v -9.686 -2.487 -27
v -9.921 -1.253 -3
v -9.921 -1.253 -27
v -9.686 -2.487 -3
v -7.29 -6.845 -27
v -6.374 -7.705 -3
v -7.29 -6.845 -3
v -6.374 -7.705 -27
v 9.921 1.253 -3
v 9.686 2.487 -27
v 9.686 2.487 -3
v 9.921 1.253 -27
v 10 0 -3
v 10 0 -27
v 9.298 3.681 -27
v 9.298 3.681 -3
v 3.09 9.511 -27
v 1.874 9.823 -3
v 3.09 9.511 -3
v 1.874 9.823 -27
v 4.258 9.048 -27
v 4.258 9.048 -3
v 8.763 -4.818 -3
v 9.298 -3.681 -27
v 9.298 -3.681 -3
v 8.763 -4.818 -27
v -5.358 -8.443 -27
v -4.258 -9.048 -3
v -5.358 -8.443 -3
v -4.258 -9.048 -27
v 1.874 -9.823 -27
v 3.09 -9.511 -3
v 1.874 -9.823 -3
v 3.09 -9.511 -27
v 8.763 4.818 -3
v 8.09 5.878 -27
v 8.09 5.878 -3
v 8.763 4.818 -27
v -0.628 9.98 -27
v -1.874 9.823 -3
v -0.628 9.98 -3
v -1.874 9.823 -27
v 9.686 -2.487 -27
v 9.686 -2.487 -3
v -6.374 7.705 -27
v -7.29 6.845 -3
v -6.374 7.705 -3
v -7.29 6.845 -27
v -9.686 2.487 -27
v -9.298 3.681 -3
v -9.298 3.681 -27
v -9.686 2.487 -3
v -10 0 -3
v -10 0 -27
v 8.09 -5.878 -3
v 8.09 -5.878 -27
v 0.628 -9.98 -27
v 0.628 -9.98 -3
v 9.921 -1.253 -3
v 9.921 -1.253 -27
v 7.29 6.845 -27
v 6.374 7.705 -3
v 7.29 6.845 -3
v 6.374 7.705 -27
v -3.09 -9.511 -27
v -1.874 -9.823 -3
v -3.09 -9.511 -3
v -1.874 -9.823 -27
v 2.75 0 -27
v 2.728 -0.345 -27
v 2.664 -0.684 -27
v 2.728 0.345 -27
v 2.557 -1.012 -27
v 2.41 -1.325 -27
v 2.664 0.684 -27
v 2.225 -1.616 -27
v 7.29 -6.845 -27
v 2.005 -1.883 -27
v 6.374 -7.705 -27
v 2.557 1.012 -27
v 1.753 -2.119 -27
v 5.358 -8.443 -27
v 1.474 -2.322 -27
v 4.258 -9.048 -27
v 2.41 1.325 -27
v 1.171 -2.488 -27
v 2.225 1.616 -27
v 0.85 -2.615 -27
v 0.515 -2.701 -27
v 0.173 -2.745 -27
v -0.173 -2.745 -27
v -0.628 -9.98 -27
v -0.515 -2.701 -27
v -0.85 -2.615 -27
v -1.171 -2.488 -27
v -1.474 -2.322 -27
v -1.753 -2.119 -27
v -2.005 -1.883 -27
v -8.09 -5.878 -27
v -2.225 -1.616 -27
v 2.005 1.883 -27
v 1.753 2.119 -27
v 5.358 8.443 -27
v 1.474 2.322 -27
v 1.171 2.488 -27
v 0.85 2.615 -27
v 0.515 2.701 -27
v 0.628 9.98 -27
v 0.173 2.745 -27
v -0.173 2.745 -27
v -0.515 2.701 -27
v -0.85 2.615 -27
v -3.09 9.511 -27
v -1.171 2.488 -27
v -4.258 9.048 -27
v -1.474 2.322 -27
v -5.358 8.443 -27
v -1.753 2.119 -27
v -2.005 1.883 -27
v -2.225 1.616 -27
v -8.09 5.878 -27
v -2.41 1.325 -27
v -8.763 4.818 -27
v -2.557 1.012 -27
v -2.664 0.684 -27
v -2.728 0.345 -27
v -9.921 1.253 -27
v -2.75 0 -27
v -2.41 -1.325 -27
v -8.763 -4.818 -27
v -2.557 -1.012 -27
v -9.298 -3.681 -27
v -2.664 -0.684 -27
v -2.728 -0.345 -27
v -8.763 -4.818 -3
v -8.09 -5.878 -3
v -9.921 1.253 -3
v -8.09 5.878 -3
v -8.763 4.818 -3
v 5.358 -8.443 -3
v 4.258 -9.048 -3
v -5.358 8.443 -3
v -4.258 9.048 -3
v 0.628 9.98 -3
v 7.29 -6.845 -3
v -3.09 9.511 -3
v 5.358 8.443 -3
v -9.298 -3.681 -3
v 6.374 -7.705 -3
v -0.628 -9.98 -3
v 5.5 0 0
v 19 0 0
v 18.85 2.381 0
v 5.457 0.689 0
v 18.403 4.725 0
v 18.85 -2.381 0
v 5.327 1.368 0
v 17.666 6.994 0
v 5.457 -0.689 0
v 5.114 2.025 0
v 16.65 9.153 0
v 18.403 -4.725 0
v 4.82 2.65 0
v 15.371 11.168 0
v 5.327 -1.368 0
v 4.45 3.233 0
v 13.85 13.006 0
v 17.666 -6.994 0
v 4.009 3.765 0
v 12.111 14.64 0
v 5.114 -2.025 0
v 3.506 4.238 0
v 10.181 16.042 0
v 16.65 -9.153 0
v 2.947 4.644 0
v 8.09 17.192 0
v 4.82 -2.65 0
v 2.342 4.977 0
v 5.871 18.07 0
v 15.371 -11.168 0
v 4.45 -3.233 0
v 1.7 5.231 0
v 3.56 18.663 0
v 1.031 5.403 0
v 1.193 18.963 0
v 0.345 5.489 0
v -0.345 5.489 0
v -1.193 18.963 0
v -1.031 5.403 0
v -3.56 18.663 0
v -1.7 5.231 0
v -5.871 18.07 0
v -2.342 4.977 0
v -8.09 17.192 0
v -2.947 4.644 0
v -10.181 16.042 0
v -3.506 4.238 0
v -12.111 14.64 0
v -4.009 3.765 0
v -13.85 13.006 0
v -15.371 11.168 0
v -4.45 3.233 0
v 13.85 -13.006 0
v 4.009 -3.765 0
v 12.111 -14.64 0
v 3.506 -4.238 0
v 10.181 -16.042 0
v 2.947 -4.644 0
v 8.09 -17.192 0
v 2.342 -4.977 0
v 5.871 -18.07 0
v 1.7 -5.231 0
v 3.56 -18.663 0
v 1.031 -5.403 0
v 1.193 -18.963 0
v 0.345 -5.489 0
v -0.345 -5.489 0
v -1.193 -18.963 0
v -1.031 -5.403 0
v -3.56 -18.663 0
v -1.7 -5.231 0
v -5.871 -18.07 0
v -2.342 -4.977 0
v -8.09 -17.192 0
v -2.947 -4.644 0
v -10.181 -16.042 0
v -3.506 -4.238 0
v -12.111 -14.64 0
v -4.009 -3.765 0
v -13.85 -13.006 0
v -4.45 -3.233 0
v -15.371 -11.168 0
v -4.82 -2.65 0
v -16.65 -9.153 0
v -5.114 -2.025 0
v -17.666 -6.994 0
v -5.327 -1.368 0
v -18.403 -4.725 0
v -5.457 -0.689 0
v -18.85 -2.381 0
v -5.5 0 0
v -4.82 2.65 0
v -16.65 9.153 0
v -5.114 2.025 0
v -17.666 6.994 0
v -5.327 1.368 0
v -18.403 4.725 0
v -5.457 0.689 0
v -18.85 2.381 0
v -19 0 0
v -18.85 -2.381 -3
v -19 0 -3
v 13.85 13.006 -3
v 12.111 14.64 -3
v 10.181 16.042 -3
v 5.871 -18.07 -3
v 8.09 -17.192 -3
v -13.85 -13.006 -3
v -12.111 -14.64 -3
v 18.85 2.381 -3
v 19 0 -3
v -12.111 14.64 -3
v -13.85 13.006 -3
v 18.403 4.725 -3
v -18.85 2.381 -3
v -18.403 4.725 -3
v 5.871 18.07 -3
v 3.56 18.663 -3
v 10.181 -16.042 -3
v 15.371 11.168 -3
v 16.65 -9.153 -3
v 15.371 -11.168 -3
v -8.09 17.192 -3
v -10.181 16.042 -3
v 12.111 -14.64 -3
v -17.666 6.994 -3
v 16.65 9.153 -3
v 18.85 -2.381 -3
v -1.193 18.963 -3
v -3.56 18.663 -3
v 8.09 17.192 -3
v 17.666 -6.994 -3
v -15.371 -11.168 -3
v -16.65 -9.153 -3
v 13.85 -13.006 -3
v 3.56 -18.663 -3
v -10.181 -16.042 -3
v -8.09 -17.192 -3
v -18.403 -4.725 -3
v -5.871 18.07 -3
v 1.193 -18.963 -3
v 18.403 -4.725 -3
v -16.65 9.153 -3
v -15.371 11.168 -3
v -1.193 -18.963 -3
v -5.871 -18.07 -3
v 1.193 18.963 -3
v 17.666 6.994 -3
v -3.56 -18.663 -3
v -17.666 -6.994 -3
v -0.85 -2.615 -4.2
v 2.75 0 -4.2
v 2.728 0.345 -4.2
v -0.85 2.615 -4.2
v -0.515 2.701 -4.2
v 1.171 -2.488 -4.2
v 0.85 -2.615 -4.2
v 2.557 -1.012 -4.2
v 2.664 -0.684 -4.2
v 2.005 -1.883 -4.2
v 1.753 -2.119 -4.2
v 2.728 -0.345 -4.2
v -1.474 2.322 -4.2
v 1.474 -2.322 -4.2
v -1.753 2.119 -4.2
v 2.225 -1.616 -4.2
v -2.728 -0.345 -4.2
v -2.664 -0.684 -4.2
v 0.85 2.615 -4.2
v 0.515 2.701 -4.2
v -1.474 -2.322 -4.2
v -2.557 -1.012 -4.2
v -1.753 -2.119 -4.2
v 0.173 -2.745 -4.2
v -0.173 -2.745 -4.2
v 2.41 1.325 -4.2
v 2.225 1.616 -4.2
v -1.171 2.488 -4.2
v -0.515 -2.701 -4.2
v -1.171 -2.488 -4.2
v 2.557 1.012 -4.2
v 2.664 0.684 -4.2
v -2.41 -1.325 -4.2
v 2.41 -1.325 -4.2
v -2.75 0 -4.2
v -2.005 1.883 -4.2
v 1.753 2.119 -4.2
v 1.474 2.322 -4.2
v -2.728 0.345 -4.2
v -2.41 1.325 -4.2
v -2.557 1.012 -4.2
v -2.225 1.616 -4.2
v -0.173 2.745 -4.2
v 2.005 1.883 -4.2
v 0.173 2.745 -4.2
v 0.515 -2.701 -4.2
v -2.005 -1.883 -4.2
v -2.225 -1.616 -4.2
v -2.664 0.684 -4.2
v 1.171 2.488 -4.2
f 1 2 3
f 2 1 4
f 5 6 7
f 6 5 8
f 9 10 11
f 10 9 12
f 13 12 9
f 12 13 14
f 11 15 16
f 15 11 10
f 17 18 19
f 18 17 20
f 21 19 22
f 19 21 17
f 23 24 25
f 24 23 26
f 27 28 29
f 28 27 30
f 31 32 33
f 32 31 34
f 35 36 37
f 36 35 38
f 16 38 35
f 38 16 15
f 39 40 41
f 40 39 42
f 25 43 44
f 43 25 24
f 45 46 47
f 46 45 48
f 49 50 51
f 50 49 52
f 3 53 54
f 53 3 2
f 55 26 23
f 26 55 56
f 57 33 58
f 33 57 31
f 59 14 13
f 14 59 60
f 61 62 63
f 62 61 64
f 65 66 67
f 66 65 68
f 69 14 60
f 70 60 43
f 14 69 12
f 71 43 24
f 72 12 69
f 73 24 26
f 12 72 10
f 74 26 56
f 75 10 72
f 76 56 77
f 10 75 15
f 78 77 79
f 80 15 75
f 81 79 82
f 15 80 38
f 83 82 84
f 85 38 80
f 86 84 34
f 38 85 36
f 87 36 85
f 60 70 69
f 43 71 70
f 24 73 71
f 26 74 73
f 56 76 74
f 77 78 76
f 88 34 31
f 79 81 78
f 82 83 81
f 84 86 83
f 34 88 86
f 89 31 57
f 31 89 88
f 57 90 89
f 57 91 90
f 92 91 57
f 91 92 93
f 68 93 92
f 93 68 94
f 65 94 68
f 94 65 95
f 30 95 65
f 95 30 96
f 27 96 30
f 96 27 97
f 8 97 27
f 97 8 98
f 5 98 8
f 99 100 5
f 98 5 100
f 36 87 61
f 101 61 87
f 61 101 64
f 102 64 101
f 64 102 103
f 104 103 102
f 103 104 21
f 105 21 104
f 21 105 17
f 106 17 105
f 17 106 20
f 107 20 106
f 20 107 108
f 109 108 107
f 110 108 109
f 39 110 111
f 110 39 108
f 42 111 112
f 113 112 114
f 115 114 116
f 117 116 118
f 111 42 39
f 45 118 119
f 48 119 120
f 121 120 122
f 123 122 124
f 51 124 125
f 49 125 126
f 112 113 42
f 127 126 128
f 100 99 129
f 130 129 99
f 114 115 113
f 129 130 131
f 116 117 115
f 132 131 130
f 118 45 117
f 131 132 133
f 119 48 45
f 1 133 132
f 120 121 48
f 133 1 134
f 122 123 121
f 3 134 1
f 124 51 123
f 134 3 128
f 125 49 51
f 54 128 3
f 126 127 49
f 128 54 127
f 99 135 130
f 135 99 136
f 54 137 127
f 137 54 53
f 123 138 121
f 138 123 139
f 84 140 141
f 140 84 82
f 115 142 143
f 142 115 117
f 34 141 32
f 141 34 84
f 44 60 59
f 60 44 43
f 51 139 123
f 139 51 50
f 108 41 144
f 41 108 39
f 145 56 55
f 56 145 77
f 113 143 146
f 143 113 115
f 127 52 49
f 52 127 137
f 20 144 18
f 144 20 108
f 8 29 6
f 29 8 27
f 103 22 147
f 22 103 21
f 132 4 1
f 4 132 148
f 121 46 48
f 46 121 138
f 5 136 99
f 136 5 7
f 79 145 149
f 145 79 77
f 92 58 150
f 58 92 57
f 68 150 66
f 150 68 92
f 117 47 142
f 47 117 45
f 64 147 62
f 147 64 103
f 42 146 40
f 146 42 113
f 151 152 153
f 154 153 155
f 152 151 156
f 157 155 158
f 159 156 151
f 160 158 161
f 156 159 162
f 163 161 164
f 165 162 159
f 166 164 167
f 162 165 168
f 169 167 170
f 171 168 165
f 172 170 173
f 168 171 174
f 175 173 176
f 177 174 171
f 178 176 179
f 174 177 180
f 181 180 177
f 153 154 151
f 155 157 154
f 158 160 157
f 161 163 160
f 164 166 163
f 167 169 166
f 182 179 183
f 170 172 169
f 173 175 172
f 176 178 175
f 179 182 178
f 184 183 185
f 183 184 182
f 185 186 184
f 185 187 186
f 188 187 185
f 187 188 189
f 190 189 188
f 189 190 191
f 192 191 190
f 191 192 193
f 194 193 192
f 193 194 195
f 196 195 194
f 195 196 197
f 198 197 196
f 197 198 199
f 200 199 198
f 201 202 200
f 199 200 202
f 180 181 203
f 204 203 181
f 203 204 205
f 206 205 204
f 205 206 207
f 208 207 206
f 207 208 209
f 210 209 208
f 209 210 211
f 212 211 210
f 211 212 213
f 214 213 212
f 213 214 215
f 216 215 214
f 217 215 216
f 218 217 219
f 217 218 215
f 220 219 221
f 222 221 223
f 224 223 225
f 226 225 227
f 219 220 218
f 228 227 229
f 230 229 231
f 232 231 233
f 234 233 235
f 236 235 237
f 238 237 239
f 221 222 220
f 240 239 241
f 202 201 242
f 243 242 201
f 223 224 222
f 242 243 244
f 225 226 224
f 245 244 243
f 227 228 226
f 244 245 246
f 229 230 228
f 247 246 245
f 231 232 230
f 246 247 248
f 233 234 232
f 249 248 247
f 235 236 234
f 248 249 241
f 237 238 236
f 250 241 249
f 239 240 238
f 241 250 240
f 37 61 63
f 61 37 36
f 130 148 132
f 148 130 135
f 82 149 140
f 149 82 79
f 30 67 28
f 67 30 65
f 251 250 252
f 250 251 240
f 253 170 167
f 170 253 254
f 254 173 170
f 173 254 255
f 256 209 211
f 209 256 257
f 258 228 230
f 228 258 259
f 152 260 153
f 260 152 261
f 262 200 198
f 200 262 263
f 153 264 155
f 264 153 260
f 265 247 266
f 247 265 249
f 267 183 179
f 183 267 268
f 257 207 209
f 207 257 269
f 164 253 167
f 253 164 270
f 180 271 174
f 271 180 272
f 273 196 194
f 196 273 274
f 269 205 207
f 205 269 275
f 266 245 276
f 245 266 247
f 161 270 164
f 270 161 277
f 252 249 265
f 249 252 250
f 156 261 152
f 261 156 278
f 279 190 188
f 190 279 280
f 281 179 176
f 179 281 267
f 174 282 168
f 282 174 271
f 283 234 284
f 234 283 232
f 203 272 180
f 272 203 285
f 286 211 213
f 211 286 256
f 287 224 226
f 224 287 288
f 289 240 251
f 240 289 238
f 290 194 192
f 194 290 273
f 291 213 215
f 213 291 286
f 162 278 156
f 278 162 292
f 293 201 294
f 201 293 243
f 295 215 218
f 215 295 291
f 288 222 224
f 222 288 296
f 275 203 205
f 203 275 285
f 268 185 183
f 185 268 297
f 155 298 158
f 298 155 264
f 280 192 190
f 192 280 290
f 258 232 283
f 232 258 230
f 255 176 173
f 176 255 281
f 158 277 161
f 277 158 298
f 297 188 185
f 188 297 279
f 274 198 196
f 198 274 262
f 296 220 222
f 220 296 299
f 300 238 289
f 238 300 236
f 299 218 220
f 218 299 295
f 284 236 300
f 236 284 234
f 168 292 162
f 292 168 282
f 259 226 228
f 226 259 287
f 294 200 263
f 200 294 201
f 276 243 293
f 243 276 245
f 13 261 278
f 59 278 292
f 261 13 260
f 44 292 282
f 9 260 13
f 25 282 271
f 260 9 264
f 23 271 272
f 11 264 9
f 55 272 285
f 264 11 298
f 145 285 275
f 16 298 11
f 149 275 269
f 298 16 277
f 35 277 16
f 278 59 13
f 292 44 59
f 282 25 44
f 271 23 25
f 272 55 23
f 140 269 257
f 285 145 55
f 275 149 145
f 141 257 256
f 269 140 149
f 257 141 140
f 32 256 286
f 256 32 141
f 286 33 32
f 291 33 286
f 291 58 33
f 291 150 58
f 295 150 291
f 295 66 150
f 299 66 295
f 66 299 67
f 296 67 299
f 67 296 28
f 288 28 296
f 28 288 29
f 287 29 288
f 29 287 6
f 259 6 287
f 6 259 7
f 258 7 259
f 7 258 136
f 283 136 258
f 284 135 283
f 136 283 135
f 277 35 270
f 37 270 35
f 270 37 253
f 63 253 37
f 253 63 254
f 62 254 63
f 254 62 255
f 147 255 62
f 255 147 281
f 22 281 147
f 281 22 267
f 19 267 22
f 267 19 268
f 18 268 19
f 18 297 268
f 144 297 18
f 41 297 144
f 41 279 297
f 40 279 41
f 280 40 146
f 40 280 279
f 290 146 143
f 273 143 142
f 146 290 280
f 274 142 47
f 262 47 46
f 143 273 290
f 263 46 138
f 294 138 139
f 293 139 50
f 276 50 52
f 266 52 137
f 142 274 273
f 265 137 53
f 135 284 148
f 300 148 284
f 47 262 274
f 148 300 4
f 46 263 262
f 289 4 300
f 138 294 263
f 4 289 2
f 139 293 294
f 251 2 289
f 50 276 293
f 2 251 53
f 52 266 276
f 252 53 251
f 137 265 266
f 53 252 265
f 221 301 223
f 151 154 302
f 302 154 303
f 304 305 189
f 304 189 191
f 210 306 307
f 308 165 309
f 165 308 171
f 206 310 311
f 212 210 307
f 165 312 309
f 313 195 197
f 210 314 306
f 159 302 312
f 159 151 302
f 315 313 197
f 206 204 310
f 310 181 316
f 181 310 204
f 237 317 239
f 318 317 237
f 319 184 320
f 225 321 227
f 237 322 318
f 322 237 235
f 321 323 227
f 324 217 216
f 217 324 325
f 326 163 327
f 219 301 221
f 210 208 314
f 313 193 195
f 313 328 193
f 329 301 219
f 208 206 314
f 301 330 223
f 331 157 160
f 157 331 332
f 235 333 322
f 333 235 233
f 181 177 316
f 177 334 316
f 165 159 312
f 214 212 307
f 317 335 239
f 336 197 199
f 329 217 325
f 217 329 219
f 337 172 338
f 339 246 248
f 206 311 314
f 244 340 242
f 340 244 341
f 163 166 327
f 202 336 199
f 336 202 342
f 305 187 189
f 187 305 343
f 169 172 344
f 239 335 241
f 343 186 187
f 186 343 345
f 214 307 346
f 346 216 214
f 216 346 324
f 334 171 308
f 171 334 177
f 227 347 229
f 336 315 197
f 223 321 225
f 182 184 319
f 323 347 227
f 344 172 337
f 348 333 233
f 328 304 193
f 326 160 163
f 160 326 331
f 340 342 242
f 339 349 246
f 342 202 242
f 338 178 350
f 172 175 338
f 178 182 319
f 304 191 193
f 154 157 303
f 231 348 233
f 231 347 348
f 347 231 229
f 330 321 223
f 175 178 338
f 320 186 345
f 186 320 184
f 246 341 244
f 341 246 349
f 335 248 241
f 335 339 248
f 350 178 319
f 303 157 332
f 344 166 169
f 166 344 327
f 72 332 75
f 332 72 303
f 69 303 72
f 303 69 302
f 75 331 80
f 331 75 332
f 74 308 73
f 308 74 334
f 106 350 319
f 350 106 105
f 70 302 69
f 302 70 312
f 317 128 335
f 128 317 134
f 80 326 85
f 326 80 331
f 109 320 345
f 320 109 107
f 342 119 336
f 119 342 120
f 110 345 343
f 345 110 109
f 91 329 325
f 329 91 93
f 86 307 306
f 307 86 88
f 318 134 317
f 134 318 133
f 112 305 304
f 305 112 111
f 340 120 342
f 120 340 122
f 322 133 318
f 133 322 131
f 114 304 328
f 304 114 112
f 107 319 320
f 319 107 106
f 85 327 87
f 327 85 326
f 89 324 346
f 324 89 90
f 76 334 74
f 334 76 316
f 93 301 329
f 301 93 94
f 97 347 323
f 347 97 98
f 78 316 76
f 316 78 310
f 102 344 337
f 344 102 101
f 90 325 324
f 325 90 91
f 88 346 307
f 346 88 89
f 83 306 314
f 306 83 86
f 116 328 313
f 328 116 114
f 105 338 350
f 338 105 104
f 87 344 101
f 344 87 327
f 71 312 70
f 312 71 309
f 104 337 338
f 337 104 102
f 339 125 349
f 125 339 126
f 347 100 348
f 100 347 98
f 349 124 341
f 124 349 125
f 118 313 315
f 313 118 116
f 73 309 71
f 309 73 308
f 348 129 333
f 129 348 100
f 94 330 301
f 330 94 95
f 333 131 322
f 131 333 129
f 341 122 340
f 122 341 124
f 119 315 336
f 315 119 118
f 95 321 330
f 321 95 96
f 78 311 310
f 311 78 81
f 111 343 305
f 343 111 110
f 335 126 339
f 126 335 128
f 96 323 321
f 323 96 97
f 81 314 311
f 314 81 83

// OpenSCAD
$fn = 50;


difference() {
	union() {
		translate(v = [0, 0, -27.0000000000]) {
			cylinder(h = 27, r = 10.0000000000);
		}
		translate(v = [0, 0, -3.0000000000]) {
			cylinder(h = 3, r = 19.0000000000);
		}
	}
	union() {
		translate(v = [0, 0, 0]) {
			rotate(a = [0, 0, 0]) {
				difference() {
					union() {
						#translate(v = [0, 0, -27.0000000000]) {
							cylinder(h = 27, r = 2.2500000000);
						}
						#translate(v = [0, 0, -4.2000000000]) {
							cylinder(h = 4.2000000000, r1 = 2.7500000000, r2 = 5.5000000000);
						}
						#translate(v = [0, 0, -27.0000000000]) {
							cylinder(h = 27, r = 2.7500000000);
						}
						#translate(v = [0, 0, -27.0000000000]) {
							cylinder(h = 27, r = 2.2500000000);
						}
					}
					union();
				}
			}
		}
	}
}
